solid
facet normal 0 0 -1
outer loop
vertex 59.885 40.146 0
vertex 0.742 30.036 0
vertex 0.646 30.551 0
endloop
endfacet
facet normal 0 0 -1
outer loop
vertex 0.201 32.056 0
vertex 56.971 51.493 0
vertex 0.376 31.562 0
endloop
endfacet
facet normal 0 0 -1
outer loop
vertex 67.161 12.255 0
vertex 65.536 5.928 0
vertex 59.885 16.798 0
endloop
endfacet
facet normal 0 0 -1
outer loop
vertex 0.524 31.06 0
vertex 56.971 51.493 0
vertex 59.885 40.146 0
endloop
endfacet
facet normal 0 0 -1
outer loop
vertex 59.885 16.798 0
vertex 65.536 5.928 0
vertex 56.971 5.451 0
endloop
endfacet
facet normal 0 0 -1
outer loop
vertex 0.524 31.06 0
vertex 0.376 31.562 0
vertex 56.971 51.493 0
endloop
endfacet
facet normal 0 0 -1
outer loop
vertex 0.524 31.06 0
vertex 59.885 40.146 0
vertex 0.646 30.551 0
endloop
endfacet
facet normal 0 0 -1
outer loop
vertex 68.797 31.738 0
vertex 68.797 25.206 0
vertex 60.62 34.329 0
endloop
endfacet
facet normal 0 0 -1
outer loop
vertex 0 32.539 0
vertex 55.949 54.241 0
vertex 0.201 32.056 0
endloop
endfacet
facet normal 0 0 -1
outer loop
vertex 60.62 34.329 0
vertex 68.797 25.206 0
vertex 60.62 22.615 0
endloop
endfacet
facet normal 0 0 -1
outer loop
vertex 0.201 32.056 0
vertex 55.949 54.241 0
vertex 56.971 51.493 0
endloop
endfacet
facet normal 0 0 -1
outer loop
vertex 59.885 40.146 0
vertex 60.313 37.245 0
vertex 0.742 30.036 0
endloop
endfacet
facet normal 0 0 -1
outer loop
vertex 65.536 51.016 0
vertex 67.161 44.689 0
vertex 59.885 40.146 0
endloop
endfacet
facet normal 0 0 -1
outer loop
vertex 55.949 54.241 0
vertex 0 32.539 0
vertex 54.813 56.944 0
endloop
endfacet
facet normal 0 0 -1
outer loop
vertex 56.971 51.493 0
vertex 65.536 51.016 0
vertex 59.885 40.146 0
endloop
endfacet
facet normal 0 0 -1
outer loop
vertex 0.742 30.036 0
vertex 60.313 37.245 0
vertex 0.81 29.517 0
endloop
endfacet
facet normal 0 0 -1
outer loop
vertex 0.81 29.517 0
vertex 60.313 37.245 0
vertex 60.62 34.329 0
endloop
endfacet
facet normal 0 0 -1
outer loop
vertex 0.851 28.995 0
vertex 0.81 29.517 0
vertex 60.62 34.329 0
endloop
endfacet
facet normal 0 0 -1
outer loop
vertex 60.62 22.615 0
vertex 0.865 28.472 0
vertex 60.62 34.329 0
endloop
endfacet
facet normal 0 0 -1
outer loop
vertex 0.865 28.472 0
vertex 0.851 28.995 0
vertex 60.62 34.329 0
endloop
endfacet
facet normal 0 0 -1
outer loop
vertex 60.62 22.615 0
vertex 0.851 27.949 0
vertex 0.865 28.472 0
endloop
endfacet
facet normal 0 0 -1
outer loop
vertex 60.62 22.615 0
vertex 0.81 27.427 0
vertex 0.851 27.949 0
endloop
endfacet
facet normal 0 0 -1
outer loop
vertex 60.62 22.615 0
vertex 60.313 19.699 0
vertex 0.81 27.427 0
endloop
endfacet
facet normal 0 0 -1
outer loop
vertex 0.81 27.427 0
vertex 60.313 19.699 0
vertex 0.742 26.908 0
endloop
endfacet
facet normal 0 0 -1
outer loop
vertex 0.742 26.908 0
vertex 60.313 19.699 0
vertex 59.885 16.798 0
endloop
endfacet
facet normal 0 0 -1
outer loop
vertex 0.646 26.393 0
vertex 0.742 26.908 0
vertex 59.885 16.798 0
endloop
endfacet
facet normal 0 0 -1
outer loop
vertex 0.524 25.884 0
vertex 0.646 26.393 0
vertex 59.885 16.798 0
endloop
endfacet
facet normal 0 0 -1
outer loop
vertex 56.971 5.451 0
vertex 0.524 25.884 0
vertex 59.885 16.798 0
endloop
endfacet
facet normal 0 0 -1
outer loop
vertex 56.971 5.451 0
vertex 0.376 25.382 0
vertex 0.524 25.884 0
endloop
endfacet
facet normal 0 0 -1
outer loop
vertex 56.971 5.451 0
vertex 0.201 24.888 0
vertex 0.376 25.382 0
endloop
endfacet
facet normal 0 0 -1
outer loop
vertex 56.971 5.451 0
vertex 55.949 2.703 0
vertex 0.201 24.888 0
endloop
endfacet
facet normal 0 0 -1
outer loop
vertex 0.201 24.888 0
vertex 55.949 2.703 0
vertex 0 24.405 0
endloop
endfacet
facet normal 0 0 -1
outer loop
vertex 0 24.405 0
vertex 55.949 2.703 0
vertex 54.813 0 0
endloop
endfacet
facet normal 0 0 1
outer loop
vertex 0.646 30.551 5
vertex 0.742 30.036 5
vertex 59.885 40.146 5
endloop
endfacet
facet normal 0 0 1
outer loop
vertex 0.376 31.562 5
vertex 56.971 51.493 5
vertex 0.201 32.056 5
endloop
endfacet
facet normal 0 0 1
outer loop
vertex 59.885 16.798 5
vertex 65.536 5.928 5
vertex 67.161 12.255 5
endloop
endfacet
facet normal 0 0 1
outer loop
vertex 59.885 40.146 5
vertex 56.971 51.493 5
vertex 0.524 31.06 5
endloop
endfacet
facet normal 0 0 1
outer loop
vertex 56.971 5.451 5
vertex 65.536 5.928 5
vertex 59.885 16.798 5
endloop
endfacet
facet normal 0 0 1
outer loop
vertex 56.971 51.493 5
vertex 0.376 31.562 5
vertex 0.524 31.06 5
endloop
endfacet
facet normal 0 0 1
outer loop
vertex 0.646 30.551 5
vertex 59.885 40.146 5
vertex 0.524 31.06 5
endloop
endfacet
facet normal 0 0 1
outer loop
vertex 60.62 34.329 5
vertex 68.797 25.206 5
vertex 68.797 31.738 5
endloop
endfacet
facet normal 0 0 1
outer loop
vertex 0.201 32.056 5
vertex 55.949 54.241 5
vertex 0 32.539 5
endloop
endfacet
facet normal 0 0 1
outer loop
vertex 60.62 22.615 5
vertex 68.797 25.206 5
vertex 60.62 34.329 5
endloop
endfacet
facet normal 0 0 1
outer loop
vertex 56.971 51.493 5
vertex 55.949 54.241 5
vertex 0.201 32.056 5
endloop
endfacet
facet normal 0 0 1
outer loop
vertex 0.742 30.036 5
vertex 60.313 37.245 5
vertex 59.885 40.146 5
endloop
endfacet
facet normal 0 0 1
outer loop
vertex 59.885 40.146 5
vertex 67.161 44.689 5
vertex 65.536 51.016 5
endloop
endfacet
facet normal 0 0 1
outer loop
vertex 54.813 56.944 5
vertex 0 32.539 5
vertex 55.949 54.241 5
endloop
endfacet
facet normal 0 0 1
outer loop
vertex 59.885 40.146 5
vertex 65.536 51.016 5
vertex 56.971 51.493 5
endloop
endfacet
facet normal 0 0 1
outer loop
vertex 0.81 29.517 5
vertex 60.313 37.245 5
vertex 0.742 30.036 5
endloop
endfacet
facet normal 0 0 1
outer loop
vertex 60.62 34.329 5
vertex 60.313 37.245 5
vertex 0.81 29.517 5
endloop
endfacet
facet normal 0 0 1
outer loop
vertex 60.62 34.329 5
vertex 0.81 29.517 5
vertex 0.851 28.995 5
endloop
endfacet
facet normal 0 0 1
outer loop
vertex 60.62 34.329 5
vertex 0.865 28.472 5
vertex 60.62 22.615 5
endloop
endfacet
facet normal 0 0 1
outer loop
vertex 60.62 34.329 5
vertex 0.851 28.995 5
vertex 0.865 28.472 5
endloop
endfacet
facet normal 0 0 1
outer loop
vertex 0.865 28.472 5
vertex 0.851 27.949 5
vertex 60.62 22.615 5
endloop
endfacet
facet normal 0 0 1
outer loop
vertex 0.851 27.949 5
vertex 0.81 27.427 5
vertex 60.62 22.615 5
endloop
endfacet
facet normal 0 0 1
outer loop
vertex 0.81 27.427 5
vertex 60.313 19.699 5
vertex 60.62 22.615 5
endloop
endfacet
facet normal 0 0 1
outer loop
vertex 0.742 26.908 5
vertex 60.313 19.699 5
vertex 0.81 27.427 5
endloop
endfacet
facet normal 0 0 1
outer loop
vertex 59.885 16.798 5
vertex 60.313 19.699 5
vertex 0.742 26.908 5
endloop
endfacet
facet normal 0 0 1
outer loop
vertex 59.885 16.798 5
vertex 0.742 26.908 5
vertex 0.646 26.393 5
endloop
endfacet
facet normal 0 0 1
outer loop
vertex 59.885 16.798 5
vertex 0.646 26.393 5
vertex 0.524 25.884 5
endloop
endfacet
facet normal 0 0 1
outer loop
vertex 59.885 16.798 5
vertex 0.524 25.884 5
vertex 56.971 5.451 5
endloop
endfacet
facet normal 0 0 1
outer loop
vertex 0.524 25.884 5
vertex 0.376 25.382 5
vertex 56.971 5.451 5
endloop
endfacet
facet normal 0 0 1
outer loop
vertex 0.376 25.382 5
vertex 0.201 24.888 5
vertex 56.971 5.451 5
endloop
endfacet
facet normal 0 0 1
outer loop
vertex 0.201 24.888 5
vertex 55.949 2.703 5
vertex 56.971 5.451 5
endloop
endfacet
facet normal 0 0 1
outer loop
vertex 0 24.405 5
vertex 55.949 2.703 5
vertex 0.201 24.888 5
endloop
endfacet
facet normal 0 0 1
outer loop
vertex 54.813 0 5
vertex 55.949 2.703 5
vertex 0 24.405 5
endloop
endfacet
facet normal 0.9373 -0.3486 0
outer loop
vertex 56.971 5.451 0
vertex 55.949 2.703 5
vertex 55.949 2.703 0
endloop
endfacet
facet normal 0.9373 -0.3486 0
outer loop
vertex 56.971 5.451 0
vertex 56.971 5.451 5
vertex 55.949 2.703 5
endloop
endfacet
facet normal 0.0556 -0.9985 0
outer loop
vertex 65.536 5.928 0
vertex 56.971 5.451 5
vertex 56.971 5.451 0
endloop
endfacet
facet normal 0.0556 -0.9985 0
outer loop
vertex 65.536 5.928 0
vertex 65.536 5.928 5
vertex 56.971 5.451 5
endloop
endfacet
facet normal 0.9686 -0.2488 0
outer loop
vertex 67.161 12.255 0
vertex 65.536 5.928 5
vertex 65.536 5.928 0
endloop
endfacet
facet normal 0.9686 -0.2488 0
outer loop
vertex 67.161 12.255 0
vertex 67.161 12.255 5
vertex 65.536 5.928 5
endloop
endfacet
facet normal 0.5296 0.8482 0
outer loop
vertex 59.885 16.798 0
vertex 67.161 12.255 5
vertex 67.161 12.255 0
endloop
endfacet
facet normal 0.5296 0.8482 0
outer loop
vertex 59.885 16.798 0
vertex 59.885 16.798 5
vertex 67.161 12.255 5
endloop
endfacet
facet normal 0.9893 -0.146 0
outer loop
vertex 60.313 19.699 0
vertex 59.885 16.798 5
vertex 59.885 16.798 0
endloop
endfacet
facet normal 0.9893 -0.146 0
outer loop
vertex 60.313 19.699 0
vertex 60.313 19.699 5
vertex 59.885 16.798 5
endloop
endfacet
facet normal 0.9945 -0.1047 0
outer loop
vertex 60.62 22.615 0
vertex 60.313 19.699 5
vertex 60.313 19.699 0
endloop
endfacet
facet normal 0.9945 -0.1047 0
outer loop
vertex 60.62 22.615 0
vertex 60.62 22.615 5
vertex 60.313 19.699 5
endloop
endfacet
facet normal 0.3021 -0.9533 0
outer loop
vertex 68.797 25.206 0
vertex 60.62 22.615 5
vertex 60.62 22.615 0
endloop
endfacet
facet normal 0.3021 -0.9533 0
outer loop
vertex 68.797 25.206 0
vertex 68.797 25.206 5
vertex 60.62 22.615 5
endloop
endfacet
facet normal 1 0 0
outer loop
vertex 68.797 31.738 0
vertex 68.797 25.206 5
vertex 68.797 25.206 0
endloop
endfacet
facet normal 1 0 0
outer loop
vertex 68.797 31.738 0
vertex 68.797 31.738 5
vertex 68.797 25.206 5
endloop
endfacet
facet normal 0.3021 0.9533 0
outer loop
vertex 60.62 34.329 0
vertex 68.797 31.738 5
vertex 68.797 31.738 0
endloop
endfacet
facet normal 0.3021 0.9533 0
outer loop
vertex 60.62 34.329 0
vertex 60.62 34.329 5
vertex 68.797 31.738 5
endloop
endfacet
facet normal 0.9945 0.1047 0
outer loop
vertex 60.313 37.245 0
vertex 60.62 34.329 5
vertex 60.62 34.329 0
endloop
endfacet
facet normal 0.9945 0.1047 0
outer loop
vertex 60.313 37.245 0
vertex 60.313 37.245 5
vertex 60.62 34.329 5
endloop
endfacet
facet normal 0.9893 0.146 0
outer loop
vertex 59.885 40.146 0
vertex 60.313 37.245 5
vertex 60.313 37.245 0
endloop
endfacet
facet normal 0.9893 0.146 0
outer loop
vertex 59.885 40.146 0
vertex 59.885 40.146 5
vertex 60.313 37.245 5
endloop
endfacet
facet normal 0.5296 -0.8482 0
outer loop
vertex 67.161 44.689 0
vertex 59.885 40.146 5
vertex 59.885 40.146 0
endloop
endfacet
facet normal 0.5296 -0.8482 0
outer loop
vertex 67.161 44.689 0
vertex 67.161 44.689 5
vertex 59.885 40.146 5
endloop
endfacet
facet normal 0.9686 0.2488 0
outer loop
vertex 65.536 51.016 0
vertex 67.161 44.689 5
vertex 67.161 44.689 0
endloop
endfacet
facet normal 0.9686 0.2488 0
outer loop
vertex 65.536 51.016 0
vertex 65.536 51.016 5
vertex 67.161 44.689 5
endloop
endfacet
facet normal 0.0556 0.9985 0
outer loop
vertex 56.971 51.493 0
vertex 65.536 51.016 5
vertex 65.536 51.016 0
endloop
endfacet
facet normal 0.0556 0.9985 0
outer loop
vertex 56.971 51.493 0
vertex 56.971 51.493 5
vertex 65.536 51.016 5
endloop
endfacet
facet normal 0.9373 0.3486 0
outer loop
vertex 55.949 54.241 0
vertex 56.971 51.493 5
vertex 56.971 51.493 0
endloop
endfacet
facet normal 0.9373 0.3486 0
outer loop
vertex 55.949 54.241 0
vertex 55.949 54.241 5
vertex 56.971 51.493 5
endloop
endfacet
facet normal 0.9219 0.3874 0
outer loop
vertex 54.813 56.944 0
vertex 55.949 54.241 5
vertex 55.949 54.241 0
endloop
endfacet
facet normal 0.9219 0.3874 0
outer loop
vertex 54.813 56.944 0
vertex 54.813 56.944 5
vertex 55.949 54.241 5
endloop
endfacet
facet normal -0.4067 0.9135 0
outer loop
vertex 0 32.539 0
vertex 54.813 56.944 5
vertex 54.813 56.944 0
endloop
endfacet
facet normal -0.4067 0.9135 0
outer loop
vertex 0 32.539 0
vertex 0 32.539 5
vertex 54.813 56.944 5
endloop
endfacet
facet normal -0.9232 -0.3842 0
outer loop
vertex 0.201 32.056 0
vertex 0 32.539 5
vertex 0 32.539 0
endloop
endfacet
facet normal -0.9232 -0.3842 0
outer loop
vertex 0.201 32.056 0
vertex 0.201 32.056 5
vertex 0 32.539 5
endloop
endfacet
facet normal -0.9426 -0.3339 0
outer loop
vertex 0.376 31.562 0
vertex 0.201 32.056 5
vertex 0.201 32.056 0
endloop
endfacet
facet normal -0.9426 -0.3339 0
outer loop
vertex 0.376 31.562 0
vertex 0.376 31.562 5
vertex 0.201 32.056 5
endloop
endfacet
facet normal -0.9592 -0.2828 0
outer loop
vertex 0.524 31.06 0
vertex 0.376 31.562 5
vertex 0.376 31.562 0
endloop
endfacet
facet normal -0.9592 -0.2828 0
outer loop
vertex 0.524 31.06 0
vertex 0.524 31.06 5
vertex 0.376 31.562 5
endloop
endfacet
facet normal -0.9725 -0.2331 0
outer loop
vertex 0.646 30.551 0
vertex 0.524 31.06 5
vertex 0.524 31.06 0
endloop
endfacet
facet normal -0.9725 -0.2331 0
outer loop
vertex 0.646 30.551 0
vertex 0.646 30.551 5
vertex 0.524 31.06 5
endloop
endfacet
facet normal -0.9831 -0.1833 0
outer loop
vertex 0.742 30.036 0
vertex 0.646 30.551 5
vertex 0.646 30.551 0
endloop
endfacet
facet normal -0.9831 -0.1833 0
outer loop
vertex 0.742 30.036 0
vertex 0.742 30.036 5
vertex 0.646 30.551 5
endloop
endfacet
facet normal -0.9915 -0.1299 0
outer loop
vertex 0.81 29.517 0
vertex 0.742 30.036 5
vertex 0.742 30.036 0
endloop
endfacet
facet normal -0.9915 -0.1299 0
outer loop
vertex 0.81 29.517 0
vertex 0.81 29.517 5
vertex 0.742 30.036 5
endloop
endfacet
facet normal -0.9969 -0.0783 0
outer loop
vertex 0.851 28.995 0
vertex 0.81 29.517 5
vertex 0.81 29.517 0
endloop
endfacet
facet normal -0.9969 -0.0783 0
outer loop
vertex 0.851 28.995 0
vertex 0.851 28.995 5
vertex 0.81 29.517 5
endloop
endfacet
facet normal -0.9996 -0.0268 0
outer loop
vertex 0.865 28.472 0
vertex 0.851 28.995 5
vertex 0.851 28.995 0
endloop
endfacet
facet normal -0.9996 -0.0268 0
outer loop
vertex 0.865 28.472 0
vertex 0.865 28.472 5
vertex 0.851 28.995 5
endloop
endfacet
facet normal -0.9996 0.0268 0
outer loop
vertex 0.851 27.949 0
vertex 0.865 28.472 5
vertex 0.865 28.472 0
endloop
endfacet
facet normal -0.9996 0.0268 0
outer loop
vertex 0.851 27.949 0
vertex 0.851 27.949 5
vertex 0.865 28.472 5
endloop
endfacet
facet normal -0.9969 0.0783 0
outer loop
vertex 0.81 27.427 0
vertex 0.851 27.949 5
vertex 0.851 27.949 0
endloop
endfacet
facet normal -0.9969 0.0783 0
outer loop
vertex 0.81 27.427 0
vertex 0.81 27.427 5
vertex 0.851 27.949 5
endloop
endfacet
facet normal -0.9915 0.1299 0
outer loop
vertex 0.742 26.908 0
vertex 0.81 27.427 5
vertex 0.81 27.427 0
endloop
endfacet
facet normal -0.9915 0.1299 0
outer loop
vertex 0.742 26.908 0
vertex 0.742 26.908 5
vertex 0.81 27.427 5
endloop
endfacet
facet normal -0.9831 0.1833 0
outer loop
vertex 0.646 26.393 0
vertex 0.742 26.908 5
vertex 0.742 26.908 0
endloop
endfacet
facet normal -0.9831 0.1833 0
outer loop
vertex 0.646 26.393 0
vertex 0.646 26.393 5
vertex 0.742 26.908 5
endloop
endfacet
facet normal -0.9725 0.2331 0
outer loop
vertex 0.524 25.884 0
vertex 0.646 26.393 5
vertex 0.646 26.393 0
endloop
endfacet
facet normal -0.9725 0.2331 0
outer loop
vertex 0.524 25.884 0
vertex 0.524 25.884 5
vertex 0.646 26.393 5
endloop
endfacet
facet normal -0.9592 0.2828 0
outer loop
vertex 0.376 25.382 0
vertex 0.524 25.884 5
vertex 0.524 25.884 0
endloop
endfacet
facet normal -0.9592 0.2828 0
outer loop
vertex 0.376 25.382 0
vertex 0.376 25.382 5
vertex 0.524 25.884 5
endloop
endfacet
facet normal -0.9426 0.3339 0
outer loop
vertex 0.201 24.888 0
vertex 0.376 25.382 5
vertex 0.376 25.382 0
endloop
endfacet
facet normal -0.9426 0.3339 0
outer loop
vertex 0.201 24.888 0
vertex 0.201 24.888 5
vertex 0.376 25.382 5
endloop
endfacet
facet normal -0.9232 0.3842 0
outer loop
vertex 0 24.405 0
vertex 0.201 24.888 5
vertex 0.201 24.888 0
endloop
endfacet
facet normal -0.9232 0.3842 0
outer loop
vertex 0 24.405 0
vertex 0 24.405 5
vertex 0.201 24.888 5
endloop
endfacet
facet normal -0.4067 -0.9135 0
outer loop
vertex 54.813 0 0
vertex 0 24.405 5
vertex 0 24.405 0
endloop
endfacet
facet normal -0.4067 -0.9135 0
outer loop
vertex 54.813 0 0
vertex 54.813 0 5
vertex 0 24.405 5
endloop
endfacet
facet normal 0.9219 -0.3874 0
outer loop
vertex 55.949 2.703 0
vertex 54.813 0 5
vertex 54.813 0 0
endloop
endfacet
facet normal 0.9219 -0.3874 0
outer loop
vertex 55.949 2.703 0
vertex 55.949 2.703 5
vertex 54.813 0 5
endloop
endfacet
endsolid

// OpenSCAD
$fn = 32;

// ----------------------------------------------------------------------
// Gear sector: 3 teeth on 48 degrees
// ----------------------------------------------------------------------

// --- parameters (mm) ---
sector_angle = 48;        // sector angle, degrees
root_r = 70;              // root circle radius
tooth_h = 8;              // tooth height over the root circle
teeth = 3;                // number of teeth on the sector
hub_r = 10;               // hub bore radius
plate_t = 5;              // sector thickness, Z
arc_step = 3;             // sampling step of the root/hub arcs, degrees

tip_r = root_r + tooth_h;  // tip circle radius

profile = [[54.813, 0], [55.949, 2.703], [56.971, 5.451], [65.536, 5.928], [67.161, 12.255], [59.885, 16.798], [60.313, 19.699], [60.62, 22.615], [68.797, 25.206], [68.797, 31.738], [60.62, 34.329], [60.313, 37.245], [59.885, 40.146], [67.161, 44.689], [65.536, 51.016], [56.971, 51.493], [55.949, 54.241], [54.813, 56.944], [0, 32.539], [0.201, 32.056], [0.376, 31.562], [0.524, 31.06], [0.646, 30.551], [0.742, 30.036], [0.81, 29.517], [0.851, 28.995], [0.865, 28.472], [0.851, 27.949], [0.81, 27.427], [0.742, 26.908], [0.646, 26.393], [0.524, 25.884], [0.376, 25.382], [0.201, 24.888], [0, 24.405]];  // primary outline, 35 points, counter clockwise

// --- the one profile operation ---
linear_extrude(height = plate_t) polygon(points = profile);
